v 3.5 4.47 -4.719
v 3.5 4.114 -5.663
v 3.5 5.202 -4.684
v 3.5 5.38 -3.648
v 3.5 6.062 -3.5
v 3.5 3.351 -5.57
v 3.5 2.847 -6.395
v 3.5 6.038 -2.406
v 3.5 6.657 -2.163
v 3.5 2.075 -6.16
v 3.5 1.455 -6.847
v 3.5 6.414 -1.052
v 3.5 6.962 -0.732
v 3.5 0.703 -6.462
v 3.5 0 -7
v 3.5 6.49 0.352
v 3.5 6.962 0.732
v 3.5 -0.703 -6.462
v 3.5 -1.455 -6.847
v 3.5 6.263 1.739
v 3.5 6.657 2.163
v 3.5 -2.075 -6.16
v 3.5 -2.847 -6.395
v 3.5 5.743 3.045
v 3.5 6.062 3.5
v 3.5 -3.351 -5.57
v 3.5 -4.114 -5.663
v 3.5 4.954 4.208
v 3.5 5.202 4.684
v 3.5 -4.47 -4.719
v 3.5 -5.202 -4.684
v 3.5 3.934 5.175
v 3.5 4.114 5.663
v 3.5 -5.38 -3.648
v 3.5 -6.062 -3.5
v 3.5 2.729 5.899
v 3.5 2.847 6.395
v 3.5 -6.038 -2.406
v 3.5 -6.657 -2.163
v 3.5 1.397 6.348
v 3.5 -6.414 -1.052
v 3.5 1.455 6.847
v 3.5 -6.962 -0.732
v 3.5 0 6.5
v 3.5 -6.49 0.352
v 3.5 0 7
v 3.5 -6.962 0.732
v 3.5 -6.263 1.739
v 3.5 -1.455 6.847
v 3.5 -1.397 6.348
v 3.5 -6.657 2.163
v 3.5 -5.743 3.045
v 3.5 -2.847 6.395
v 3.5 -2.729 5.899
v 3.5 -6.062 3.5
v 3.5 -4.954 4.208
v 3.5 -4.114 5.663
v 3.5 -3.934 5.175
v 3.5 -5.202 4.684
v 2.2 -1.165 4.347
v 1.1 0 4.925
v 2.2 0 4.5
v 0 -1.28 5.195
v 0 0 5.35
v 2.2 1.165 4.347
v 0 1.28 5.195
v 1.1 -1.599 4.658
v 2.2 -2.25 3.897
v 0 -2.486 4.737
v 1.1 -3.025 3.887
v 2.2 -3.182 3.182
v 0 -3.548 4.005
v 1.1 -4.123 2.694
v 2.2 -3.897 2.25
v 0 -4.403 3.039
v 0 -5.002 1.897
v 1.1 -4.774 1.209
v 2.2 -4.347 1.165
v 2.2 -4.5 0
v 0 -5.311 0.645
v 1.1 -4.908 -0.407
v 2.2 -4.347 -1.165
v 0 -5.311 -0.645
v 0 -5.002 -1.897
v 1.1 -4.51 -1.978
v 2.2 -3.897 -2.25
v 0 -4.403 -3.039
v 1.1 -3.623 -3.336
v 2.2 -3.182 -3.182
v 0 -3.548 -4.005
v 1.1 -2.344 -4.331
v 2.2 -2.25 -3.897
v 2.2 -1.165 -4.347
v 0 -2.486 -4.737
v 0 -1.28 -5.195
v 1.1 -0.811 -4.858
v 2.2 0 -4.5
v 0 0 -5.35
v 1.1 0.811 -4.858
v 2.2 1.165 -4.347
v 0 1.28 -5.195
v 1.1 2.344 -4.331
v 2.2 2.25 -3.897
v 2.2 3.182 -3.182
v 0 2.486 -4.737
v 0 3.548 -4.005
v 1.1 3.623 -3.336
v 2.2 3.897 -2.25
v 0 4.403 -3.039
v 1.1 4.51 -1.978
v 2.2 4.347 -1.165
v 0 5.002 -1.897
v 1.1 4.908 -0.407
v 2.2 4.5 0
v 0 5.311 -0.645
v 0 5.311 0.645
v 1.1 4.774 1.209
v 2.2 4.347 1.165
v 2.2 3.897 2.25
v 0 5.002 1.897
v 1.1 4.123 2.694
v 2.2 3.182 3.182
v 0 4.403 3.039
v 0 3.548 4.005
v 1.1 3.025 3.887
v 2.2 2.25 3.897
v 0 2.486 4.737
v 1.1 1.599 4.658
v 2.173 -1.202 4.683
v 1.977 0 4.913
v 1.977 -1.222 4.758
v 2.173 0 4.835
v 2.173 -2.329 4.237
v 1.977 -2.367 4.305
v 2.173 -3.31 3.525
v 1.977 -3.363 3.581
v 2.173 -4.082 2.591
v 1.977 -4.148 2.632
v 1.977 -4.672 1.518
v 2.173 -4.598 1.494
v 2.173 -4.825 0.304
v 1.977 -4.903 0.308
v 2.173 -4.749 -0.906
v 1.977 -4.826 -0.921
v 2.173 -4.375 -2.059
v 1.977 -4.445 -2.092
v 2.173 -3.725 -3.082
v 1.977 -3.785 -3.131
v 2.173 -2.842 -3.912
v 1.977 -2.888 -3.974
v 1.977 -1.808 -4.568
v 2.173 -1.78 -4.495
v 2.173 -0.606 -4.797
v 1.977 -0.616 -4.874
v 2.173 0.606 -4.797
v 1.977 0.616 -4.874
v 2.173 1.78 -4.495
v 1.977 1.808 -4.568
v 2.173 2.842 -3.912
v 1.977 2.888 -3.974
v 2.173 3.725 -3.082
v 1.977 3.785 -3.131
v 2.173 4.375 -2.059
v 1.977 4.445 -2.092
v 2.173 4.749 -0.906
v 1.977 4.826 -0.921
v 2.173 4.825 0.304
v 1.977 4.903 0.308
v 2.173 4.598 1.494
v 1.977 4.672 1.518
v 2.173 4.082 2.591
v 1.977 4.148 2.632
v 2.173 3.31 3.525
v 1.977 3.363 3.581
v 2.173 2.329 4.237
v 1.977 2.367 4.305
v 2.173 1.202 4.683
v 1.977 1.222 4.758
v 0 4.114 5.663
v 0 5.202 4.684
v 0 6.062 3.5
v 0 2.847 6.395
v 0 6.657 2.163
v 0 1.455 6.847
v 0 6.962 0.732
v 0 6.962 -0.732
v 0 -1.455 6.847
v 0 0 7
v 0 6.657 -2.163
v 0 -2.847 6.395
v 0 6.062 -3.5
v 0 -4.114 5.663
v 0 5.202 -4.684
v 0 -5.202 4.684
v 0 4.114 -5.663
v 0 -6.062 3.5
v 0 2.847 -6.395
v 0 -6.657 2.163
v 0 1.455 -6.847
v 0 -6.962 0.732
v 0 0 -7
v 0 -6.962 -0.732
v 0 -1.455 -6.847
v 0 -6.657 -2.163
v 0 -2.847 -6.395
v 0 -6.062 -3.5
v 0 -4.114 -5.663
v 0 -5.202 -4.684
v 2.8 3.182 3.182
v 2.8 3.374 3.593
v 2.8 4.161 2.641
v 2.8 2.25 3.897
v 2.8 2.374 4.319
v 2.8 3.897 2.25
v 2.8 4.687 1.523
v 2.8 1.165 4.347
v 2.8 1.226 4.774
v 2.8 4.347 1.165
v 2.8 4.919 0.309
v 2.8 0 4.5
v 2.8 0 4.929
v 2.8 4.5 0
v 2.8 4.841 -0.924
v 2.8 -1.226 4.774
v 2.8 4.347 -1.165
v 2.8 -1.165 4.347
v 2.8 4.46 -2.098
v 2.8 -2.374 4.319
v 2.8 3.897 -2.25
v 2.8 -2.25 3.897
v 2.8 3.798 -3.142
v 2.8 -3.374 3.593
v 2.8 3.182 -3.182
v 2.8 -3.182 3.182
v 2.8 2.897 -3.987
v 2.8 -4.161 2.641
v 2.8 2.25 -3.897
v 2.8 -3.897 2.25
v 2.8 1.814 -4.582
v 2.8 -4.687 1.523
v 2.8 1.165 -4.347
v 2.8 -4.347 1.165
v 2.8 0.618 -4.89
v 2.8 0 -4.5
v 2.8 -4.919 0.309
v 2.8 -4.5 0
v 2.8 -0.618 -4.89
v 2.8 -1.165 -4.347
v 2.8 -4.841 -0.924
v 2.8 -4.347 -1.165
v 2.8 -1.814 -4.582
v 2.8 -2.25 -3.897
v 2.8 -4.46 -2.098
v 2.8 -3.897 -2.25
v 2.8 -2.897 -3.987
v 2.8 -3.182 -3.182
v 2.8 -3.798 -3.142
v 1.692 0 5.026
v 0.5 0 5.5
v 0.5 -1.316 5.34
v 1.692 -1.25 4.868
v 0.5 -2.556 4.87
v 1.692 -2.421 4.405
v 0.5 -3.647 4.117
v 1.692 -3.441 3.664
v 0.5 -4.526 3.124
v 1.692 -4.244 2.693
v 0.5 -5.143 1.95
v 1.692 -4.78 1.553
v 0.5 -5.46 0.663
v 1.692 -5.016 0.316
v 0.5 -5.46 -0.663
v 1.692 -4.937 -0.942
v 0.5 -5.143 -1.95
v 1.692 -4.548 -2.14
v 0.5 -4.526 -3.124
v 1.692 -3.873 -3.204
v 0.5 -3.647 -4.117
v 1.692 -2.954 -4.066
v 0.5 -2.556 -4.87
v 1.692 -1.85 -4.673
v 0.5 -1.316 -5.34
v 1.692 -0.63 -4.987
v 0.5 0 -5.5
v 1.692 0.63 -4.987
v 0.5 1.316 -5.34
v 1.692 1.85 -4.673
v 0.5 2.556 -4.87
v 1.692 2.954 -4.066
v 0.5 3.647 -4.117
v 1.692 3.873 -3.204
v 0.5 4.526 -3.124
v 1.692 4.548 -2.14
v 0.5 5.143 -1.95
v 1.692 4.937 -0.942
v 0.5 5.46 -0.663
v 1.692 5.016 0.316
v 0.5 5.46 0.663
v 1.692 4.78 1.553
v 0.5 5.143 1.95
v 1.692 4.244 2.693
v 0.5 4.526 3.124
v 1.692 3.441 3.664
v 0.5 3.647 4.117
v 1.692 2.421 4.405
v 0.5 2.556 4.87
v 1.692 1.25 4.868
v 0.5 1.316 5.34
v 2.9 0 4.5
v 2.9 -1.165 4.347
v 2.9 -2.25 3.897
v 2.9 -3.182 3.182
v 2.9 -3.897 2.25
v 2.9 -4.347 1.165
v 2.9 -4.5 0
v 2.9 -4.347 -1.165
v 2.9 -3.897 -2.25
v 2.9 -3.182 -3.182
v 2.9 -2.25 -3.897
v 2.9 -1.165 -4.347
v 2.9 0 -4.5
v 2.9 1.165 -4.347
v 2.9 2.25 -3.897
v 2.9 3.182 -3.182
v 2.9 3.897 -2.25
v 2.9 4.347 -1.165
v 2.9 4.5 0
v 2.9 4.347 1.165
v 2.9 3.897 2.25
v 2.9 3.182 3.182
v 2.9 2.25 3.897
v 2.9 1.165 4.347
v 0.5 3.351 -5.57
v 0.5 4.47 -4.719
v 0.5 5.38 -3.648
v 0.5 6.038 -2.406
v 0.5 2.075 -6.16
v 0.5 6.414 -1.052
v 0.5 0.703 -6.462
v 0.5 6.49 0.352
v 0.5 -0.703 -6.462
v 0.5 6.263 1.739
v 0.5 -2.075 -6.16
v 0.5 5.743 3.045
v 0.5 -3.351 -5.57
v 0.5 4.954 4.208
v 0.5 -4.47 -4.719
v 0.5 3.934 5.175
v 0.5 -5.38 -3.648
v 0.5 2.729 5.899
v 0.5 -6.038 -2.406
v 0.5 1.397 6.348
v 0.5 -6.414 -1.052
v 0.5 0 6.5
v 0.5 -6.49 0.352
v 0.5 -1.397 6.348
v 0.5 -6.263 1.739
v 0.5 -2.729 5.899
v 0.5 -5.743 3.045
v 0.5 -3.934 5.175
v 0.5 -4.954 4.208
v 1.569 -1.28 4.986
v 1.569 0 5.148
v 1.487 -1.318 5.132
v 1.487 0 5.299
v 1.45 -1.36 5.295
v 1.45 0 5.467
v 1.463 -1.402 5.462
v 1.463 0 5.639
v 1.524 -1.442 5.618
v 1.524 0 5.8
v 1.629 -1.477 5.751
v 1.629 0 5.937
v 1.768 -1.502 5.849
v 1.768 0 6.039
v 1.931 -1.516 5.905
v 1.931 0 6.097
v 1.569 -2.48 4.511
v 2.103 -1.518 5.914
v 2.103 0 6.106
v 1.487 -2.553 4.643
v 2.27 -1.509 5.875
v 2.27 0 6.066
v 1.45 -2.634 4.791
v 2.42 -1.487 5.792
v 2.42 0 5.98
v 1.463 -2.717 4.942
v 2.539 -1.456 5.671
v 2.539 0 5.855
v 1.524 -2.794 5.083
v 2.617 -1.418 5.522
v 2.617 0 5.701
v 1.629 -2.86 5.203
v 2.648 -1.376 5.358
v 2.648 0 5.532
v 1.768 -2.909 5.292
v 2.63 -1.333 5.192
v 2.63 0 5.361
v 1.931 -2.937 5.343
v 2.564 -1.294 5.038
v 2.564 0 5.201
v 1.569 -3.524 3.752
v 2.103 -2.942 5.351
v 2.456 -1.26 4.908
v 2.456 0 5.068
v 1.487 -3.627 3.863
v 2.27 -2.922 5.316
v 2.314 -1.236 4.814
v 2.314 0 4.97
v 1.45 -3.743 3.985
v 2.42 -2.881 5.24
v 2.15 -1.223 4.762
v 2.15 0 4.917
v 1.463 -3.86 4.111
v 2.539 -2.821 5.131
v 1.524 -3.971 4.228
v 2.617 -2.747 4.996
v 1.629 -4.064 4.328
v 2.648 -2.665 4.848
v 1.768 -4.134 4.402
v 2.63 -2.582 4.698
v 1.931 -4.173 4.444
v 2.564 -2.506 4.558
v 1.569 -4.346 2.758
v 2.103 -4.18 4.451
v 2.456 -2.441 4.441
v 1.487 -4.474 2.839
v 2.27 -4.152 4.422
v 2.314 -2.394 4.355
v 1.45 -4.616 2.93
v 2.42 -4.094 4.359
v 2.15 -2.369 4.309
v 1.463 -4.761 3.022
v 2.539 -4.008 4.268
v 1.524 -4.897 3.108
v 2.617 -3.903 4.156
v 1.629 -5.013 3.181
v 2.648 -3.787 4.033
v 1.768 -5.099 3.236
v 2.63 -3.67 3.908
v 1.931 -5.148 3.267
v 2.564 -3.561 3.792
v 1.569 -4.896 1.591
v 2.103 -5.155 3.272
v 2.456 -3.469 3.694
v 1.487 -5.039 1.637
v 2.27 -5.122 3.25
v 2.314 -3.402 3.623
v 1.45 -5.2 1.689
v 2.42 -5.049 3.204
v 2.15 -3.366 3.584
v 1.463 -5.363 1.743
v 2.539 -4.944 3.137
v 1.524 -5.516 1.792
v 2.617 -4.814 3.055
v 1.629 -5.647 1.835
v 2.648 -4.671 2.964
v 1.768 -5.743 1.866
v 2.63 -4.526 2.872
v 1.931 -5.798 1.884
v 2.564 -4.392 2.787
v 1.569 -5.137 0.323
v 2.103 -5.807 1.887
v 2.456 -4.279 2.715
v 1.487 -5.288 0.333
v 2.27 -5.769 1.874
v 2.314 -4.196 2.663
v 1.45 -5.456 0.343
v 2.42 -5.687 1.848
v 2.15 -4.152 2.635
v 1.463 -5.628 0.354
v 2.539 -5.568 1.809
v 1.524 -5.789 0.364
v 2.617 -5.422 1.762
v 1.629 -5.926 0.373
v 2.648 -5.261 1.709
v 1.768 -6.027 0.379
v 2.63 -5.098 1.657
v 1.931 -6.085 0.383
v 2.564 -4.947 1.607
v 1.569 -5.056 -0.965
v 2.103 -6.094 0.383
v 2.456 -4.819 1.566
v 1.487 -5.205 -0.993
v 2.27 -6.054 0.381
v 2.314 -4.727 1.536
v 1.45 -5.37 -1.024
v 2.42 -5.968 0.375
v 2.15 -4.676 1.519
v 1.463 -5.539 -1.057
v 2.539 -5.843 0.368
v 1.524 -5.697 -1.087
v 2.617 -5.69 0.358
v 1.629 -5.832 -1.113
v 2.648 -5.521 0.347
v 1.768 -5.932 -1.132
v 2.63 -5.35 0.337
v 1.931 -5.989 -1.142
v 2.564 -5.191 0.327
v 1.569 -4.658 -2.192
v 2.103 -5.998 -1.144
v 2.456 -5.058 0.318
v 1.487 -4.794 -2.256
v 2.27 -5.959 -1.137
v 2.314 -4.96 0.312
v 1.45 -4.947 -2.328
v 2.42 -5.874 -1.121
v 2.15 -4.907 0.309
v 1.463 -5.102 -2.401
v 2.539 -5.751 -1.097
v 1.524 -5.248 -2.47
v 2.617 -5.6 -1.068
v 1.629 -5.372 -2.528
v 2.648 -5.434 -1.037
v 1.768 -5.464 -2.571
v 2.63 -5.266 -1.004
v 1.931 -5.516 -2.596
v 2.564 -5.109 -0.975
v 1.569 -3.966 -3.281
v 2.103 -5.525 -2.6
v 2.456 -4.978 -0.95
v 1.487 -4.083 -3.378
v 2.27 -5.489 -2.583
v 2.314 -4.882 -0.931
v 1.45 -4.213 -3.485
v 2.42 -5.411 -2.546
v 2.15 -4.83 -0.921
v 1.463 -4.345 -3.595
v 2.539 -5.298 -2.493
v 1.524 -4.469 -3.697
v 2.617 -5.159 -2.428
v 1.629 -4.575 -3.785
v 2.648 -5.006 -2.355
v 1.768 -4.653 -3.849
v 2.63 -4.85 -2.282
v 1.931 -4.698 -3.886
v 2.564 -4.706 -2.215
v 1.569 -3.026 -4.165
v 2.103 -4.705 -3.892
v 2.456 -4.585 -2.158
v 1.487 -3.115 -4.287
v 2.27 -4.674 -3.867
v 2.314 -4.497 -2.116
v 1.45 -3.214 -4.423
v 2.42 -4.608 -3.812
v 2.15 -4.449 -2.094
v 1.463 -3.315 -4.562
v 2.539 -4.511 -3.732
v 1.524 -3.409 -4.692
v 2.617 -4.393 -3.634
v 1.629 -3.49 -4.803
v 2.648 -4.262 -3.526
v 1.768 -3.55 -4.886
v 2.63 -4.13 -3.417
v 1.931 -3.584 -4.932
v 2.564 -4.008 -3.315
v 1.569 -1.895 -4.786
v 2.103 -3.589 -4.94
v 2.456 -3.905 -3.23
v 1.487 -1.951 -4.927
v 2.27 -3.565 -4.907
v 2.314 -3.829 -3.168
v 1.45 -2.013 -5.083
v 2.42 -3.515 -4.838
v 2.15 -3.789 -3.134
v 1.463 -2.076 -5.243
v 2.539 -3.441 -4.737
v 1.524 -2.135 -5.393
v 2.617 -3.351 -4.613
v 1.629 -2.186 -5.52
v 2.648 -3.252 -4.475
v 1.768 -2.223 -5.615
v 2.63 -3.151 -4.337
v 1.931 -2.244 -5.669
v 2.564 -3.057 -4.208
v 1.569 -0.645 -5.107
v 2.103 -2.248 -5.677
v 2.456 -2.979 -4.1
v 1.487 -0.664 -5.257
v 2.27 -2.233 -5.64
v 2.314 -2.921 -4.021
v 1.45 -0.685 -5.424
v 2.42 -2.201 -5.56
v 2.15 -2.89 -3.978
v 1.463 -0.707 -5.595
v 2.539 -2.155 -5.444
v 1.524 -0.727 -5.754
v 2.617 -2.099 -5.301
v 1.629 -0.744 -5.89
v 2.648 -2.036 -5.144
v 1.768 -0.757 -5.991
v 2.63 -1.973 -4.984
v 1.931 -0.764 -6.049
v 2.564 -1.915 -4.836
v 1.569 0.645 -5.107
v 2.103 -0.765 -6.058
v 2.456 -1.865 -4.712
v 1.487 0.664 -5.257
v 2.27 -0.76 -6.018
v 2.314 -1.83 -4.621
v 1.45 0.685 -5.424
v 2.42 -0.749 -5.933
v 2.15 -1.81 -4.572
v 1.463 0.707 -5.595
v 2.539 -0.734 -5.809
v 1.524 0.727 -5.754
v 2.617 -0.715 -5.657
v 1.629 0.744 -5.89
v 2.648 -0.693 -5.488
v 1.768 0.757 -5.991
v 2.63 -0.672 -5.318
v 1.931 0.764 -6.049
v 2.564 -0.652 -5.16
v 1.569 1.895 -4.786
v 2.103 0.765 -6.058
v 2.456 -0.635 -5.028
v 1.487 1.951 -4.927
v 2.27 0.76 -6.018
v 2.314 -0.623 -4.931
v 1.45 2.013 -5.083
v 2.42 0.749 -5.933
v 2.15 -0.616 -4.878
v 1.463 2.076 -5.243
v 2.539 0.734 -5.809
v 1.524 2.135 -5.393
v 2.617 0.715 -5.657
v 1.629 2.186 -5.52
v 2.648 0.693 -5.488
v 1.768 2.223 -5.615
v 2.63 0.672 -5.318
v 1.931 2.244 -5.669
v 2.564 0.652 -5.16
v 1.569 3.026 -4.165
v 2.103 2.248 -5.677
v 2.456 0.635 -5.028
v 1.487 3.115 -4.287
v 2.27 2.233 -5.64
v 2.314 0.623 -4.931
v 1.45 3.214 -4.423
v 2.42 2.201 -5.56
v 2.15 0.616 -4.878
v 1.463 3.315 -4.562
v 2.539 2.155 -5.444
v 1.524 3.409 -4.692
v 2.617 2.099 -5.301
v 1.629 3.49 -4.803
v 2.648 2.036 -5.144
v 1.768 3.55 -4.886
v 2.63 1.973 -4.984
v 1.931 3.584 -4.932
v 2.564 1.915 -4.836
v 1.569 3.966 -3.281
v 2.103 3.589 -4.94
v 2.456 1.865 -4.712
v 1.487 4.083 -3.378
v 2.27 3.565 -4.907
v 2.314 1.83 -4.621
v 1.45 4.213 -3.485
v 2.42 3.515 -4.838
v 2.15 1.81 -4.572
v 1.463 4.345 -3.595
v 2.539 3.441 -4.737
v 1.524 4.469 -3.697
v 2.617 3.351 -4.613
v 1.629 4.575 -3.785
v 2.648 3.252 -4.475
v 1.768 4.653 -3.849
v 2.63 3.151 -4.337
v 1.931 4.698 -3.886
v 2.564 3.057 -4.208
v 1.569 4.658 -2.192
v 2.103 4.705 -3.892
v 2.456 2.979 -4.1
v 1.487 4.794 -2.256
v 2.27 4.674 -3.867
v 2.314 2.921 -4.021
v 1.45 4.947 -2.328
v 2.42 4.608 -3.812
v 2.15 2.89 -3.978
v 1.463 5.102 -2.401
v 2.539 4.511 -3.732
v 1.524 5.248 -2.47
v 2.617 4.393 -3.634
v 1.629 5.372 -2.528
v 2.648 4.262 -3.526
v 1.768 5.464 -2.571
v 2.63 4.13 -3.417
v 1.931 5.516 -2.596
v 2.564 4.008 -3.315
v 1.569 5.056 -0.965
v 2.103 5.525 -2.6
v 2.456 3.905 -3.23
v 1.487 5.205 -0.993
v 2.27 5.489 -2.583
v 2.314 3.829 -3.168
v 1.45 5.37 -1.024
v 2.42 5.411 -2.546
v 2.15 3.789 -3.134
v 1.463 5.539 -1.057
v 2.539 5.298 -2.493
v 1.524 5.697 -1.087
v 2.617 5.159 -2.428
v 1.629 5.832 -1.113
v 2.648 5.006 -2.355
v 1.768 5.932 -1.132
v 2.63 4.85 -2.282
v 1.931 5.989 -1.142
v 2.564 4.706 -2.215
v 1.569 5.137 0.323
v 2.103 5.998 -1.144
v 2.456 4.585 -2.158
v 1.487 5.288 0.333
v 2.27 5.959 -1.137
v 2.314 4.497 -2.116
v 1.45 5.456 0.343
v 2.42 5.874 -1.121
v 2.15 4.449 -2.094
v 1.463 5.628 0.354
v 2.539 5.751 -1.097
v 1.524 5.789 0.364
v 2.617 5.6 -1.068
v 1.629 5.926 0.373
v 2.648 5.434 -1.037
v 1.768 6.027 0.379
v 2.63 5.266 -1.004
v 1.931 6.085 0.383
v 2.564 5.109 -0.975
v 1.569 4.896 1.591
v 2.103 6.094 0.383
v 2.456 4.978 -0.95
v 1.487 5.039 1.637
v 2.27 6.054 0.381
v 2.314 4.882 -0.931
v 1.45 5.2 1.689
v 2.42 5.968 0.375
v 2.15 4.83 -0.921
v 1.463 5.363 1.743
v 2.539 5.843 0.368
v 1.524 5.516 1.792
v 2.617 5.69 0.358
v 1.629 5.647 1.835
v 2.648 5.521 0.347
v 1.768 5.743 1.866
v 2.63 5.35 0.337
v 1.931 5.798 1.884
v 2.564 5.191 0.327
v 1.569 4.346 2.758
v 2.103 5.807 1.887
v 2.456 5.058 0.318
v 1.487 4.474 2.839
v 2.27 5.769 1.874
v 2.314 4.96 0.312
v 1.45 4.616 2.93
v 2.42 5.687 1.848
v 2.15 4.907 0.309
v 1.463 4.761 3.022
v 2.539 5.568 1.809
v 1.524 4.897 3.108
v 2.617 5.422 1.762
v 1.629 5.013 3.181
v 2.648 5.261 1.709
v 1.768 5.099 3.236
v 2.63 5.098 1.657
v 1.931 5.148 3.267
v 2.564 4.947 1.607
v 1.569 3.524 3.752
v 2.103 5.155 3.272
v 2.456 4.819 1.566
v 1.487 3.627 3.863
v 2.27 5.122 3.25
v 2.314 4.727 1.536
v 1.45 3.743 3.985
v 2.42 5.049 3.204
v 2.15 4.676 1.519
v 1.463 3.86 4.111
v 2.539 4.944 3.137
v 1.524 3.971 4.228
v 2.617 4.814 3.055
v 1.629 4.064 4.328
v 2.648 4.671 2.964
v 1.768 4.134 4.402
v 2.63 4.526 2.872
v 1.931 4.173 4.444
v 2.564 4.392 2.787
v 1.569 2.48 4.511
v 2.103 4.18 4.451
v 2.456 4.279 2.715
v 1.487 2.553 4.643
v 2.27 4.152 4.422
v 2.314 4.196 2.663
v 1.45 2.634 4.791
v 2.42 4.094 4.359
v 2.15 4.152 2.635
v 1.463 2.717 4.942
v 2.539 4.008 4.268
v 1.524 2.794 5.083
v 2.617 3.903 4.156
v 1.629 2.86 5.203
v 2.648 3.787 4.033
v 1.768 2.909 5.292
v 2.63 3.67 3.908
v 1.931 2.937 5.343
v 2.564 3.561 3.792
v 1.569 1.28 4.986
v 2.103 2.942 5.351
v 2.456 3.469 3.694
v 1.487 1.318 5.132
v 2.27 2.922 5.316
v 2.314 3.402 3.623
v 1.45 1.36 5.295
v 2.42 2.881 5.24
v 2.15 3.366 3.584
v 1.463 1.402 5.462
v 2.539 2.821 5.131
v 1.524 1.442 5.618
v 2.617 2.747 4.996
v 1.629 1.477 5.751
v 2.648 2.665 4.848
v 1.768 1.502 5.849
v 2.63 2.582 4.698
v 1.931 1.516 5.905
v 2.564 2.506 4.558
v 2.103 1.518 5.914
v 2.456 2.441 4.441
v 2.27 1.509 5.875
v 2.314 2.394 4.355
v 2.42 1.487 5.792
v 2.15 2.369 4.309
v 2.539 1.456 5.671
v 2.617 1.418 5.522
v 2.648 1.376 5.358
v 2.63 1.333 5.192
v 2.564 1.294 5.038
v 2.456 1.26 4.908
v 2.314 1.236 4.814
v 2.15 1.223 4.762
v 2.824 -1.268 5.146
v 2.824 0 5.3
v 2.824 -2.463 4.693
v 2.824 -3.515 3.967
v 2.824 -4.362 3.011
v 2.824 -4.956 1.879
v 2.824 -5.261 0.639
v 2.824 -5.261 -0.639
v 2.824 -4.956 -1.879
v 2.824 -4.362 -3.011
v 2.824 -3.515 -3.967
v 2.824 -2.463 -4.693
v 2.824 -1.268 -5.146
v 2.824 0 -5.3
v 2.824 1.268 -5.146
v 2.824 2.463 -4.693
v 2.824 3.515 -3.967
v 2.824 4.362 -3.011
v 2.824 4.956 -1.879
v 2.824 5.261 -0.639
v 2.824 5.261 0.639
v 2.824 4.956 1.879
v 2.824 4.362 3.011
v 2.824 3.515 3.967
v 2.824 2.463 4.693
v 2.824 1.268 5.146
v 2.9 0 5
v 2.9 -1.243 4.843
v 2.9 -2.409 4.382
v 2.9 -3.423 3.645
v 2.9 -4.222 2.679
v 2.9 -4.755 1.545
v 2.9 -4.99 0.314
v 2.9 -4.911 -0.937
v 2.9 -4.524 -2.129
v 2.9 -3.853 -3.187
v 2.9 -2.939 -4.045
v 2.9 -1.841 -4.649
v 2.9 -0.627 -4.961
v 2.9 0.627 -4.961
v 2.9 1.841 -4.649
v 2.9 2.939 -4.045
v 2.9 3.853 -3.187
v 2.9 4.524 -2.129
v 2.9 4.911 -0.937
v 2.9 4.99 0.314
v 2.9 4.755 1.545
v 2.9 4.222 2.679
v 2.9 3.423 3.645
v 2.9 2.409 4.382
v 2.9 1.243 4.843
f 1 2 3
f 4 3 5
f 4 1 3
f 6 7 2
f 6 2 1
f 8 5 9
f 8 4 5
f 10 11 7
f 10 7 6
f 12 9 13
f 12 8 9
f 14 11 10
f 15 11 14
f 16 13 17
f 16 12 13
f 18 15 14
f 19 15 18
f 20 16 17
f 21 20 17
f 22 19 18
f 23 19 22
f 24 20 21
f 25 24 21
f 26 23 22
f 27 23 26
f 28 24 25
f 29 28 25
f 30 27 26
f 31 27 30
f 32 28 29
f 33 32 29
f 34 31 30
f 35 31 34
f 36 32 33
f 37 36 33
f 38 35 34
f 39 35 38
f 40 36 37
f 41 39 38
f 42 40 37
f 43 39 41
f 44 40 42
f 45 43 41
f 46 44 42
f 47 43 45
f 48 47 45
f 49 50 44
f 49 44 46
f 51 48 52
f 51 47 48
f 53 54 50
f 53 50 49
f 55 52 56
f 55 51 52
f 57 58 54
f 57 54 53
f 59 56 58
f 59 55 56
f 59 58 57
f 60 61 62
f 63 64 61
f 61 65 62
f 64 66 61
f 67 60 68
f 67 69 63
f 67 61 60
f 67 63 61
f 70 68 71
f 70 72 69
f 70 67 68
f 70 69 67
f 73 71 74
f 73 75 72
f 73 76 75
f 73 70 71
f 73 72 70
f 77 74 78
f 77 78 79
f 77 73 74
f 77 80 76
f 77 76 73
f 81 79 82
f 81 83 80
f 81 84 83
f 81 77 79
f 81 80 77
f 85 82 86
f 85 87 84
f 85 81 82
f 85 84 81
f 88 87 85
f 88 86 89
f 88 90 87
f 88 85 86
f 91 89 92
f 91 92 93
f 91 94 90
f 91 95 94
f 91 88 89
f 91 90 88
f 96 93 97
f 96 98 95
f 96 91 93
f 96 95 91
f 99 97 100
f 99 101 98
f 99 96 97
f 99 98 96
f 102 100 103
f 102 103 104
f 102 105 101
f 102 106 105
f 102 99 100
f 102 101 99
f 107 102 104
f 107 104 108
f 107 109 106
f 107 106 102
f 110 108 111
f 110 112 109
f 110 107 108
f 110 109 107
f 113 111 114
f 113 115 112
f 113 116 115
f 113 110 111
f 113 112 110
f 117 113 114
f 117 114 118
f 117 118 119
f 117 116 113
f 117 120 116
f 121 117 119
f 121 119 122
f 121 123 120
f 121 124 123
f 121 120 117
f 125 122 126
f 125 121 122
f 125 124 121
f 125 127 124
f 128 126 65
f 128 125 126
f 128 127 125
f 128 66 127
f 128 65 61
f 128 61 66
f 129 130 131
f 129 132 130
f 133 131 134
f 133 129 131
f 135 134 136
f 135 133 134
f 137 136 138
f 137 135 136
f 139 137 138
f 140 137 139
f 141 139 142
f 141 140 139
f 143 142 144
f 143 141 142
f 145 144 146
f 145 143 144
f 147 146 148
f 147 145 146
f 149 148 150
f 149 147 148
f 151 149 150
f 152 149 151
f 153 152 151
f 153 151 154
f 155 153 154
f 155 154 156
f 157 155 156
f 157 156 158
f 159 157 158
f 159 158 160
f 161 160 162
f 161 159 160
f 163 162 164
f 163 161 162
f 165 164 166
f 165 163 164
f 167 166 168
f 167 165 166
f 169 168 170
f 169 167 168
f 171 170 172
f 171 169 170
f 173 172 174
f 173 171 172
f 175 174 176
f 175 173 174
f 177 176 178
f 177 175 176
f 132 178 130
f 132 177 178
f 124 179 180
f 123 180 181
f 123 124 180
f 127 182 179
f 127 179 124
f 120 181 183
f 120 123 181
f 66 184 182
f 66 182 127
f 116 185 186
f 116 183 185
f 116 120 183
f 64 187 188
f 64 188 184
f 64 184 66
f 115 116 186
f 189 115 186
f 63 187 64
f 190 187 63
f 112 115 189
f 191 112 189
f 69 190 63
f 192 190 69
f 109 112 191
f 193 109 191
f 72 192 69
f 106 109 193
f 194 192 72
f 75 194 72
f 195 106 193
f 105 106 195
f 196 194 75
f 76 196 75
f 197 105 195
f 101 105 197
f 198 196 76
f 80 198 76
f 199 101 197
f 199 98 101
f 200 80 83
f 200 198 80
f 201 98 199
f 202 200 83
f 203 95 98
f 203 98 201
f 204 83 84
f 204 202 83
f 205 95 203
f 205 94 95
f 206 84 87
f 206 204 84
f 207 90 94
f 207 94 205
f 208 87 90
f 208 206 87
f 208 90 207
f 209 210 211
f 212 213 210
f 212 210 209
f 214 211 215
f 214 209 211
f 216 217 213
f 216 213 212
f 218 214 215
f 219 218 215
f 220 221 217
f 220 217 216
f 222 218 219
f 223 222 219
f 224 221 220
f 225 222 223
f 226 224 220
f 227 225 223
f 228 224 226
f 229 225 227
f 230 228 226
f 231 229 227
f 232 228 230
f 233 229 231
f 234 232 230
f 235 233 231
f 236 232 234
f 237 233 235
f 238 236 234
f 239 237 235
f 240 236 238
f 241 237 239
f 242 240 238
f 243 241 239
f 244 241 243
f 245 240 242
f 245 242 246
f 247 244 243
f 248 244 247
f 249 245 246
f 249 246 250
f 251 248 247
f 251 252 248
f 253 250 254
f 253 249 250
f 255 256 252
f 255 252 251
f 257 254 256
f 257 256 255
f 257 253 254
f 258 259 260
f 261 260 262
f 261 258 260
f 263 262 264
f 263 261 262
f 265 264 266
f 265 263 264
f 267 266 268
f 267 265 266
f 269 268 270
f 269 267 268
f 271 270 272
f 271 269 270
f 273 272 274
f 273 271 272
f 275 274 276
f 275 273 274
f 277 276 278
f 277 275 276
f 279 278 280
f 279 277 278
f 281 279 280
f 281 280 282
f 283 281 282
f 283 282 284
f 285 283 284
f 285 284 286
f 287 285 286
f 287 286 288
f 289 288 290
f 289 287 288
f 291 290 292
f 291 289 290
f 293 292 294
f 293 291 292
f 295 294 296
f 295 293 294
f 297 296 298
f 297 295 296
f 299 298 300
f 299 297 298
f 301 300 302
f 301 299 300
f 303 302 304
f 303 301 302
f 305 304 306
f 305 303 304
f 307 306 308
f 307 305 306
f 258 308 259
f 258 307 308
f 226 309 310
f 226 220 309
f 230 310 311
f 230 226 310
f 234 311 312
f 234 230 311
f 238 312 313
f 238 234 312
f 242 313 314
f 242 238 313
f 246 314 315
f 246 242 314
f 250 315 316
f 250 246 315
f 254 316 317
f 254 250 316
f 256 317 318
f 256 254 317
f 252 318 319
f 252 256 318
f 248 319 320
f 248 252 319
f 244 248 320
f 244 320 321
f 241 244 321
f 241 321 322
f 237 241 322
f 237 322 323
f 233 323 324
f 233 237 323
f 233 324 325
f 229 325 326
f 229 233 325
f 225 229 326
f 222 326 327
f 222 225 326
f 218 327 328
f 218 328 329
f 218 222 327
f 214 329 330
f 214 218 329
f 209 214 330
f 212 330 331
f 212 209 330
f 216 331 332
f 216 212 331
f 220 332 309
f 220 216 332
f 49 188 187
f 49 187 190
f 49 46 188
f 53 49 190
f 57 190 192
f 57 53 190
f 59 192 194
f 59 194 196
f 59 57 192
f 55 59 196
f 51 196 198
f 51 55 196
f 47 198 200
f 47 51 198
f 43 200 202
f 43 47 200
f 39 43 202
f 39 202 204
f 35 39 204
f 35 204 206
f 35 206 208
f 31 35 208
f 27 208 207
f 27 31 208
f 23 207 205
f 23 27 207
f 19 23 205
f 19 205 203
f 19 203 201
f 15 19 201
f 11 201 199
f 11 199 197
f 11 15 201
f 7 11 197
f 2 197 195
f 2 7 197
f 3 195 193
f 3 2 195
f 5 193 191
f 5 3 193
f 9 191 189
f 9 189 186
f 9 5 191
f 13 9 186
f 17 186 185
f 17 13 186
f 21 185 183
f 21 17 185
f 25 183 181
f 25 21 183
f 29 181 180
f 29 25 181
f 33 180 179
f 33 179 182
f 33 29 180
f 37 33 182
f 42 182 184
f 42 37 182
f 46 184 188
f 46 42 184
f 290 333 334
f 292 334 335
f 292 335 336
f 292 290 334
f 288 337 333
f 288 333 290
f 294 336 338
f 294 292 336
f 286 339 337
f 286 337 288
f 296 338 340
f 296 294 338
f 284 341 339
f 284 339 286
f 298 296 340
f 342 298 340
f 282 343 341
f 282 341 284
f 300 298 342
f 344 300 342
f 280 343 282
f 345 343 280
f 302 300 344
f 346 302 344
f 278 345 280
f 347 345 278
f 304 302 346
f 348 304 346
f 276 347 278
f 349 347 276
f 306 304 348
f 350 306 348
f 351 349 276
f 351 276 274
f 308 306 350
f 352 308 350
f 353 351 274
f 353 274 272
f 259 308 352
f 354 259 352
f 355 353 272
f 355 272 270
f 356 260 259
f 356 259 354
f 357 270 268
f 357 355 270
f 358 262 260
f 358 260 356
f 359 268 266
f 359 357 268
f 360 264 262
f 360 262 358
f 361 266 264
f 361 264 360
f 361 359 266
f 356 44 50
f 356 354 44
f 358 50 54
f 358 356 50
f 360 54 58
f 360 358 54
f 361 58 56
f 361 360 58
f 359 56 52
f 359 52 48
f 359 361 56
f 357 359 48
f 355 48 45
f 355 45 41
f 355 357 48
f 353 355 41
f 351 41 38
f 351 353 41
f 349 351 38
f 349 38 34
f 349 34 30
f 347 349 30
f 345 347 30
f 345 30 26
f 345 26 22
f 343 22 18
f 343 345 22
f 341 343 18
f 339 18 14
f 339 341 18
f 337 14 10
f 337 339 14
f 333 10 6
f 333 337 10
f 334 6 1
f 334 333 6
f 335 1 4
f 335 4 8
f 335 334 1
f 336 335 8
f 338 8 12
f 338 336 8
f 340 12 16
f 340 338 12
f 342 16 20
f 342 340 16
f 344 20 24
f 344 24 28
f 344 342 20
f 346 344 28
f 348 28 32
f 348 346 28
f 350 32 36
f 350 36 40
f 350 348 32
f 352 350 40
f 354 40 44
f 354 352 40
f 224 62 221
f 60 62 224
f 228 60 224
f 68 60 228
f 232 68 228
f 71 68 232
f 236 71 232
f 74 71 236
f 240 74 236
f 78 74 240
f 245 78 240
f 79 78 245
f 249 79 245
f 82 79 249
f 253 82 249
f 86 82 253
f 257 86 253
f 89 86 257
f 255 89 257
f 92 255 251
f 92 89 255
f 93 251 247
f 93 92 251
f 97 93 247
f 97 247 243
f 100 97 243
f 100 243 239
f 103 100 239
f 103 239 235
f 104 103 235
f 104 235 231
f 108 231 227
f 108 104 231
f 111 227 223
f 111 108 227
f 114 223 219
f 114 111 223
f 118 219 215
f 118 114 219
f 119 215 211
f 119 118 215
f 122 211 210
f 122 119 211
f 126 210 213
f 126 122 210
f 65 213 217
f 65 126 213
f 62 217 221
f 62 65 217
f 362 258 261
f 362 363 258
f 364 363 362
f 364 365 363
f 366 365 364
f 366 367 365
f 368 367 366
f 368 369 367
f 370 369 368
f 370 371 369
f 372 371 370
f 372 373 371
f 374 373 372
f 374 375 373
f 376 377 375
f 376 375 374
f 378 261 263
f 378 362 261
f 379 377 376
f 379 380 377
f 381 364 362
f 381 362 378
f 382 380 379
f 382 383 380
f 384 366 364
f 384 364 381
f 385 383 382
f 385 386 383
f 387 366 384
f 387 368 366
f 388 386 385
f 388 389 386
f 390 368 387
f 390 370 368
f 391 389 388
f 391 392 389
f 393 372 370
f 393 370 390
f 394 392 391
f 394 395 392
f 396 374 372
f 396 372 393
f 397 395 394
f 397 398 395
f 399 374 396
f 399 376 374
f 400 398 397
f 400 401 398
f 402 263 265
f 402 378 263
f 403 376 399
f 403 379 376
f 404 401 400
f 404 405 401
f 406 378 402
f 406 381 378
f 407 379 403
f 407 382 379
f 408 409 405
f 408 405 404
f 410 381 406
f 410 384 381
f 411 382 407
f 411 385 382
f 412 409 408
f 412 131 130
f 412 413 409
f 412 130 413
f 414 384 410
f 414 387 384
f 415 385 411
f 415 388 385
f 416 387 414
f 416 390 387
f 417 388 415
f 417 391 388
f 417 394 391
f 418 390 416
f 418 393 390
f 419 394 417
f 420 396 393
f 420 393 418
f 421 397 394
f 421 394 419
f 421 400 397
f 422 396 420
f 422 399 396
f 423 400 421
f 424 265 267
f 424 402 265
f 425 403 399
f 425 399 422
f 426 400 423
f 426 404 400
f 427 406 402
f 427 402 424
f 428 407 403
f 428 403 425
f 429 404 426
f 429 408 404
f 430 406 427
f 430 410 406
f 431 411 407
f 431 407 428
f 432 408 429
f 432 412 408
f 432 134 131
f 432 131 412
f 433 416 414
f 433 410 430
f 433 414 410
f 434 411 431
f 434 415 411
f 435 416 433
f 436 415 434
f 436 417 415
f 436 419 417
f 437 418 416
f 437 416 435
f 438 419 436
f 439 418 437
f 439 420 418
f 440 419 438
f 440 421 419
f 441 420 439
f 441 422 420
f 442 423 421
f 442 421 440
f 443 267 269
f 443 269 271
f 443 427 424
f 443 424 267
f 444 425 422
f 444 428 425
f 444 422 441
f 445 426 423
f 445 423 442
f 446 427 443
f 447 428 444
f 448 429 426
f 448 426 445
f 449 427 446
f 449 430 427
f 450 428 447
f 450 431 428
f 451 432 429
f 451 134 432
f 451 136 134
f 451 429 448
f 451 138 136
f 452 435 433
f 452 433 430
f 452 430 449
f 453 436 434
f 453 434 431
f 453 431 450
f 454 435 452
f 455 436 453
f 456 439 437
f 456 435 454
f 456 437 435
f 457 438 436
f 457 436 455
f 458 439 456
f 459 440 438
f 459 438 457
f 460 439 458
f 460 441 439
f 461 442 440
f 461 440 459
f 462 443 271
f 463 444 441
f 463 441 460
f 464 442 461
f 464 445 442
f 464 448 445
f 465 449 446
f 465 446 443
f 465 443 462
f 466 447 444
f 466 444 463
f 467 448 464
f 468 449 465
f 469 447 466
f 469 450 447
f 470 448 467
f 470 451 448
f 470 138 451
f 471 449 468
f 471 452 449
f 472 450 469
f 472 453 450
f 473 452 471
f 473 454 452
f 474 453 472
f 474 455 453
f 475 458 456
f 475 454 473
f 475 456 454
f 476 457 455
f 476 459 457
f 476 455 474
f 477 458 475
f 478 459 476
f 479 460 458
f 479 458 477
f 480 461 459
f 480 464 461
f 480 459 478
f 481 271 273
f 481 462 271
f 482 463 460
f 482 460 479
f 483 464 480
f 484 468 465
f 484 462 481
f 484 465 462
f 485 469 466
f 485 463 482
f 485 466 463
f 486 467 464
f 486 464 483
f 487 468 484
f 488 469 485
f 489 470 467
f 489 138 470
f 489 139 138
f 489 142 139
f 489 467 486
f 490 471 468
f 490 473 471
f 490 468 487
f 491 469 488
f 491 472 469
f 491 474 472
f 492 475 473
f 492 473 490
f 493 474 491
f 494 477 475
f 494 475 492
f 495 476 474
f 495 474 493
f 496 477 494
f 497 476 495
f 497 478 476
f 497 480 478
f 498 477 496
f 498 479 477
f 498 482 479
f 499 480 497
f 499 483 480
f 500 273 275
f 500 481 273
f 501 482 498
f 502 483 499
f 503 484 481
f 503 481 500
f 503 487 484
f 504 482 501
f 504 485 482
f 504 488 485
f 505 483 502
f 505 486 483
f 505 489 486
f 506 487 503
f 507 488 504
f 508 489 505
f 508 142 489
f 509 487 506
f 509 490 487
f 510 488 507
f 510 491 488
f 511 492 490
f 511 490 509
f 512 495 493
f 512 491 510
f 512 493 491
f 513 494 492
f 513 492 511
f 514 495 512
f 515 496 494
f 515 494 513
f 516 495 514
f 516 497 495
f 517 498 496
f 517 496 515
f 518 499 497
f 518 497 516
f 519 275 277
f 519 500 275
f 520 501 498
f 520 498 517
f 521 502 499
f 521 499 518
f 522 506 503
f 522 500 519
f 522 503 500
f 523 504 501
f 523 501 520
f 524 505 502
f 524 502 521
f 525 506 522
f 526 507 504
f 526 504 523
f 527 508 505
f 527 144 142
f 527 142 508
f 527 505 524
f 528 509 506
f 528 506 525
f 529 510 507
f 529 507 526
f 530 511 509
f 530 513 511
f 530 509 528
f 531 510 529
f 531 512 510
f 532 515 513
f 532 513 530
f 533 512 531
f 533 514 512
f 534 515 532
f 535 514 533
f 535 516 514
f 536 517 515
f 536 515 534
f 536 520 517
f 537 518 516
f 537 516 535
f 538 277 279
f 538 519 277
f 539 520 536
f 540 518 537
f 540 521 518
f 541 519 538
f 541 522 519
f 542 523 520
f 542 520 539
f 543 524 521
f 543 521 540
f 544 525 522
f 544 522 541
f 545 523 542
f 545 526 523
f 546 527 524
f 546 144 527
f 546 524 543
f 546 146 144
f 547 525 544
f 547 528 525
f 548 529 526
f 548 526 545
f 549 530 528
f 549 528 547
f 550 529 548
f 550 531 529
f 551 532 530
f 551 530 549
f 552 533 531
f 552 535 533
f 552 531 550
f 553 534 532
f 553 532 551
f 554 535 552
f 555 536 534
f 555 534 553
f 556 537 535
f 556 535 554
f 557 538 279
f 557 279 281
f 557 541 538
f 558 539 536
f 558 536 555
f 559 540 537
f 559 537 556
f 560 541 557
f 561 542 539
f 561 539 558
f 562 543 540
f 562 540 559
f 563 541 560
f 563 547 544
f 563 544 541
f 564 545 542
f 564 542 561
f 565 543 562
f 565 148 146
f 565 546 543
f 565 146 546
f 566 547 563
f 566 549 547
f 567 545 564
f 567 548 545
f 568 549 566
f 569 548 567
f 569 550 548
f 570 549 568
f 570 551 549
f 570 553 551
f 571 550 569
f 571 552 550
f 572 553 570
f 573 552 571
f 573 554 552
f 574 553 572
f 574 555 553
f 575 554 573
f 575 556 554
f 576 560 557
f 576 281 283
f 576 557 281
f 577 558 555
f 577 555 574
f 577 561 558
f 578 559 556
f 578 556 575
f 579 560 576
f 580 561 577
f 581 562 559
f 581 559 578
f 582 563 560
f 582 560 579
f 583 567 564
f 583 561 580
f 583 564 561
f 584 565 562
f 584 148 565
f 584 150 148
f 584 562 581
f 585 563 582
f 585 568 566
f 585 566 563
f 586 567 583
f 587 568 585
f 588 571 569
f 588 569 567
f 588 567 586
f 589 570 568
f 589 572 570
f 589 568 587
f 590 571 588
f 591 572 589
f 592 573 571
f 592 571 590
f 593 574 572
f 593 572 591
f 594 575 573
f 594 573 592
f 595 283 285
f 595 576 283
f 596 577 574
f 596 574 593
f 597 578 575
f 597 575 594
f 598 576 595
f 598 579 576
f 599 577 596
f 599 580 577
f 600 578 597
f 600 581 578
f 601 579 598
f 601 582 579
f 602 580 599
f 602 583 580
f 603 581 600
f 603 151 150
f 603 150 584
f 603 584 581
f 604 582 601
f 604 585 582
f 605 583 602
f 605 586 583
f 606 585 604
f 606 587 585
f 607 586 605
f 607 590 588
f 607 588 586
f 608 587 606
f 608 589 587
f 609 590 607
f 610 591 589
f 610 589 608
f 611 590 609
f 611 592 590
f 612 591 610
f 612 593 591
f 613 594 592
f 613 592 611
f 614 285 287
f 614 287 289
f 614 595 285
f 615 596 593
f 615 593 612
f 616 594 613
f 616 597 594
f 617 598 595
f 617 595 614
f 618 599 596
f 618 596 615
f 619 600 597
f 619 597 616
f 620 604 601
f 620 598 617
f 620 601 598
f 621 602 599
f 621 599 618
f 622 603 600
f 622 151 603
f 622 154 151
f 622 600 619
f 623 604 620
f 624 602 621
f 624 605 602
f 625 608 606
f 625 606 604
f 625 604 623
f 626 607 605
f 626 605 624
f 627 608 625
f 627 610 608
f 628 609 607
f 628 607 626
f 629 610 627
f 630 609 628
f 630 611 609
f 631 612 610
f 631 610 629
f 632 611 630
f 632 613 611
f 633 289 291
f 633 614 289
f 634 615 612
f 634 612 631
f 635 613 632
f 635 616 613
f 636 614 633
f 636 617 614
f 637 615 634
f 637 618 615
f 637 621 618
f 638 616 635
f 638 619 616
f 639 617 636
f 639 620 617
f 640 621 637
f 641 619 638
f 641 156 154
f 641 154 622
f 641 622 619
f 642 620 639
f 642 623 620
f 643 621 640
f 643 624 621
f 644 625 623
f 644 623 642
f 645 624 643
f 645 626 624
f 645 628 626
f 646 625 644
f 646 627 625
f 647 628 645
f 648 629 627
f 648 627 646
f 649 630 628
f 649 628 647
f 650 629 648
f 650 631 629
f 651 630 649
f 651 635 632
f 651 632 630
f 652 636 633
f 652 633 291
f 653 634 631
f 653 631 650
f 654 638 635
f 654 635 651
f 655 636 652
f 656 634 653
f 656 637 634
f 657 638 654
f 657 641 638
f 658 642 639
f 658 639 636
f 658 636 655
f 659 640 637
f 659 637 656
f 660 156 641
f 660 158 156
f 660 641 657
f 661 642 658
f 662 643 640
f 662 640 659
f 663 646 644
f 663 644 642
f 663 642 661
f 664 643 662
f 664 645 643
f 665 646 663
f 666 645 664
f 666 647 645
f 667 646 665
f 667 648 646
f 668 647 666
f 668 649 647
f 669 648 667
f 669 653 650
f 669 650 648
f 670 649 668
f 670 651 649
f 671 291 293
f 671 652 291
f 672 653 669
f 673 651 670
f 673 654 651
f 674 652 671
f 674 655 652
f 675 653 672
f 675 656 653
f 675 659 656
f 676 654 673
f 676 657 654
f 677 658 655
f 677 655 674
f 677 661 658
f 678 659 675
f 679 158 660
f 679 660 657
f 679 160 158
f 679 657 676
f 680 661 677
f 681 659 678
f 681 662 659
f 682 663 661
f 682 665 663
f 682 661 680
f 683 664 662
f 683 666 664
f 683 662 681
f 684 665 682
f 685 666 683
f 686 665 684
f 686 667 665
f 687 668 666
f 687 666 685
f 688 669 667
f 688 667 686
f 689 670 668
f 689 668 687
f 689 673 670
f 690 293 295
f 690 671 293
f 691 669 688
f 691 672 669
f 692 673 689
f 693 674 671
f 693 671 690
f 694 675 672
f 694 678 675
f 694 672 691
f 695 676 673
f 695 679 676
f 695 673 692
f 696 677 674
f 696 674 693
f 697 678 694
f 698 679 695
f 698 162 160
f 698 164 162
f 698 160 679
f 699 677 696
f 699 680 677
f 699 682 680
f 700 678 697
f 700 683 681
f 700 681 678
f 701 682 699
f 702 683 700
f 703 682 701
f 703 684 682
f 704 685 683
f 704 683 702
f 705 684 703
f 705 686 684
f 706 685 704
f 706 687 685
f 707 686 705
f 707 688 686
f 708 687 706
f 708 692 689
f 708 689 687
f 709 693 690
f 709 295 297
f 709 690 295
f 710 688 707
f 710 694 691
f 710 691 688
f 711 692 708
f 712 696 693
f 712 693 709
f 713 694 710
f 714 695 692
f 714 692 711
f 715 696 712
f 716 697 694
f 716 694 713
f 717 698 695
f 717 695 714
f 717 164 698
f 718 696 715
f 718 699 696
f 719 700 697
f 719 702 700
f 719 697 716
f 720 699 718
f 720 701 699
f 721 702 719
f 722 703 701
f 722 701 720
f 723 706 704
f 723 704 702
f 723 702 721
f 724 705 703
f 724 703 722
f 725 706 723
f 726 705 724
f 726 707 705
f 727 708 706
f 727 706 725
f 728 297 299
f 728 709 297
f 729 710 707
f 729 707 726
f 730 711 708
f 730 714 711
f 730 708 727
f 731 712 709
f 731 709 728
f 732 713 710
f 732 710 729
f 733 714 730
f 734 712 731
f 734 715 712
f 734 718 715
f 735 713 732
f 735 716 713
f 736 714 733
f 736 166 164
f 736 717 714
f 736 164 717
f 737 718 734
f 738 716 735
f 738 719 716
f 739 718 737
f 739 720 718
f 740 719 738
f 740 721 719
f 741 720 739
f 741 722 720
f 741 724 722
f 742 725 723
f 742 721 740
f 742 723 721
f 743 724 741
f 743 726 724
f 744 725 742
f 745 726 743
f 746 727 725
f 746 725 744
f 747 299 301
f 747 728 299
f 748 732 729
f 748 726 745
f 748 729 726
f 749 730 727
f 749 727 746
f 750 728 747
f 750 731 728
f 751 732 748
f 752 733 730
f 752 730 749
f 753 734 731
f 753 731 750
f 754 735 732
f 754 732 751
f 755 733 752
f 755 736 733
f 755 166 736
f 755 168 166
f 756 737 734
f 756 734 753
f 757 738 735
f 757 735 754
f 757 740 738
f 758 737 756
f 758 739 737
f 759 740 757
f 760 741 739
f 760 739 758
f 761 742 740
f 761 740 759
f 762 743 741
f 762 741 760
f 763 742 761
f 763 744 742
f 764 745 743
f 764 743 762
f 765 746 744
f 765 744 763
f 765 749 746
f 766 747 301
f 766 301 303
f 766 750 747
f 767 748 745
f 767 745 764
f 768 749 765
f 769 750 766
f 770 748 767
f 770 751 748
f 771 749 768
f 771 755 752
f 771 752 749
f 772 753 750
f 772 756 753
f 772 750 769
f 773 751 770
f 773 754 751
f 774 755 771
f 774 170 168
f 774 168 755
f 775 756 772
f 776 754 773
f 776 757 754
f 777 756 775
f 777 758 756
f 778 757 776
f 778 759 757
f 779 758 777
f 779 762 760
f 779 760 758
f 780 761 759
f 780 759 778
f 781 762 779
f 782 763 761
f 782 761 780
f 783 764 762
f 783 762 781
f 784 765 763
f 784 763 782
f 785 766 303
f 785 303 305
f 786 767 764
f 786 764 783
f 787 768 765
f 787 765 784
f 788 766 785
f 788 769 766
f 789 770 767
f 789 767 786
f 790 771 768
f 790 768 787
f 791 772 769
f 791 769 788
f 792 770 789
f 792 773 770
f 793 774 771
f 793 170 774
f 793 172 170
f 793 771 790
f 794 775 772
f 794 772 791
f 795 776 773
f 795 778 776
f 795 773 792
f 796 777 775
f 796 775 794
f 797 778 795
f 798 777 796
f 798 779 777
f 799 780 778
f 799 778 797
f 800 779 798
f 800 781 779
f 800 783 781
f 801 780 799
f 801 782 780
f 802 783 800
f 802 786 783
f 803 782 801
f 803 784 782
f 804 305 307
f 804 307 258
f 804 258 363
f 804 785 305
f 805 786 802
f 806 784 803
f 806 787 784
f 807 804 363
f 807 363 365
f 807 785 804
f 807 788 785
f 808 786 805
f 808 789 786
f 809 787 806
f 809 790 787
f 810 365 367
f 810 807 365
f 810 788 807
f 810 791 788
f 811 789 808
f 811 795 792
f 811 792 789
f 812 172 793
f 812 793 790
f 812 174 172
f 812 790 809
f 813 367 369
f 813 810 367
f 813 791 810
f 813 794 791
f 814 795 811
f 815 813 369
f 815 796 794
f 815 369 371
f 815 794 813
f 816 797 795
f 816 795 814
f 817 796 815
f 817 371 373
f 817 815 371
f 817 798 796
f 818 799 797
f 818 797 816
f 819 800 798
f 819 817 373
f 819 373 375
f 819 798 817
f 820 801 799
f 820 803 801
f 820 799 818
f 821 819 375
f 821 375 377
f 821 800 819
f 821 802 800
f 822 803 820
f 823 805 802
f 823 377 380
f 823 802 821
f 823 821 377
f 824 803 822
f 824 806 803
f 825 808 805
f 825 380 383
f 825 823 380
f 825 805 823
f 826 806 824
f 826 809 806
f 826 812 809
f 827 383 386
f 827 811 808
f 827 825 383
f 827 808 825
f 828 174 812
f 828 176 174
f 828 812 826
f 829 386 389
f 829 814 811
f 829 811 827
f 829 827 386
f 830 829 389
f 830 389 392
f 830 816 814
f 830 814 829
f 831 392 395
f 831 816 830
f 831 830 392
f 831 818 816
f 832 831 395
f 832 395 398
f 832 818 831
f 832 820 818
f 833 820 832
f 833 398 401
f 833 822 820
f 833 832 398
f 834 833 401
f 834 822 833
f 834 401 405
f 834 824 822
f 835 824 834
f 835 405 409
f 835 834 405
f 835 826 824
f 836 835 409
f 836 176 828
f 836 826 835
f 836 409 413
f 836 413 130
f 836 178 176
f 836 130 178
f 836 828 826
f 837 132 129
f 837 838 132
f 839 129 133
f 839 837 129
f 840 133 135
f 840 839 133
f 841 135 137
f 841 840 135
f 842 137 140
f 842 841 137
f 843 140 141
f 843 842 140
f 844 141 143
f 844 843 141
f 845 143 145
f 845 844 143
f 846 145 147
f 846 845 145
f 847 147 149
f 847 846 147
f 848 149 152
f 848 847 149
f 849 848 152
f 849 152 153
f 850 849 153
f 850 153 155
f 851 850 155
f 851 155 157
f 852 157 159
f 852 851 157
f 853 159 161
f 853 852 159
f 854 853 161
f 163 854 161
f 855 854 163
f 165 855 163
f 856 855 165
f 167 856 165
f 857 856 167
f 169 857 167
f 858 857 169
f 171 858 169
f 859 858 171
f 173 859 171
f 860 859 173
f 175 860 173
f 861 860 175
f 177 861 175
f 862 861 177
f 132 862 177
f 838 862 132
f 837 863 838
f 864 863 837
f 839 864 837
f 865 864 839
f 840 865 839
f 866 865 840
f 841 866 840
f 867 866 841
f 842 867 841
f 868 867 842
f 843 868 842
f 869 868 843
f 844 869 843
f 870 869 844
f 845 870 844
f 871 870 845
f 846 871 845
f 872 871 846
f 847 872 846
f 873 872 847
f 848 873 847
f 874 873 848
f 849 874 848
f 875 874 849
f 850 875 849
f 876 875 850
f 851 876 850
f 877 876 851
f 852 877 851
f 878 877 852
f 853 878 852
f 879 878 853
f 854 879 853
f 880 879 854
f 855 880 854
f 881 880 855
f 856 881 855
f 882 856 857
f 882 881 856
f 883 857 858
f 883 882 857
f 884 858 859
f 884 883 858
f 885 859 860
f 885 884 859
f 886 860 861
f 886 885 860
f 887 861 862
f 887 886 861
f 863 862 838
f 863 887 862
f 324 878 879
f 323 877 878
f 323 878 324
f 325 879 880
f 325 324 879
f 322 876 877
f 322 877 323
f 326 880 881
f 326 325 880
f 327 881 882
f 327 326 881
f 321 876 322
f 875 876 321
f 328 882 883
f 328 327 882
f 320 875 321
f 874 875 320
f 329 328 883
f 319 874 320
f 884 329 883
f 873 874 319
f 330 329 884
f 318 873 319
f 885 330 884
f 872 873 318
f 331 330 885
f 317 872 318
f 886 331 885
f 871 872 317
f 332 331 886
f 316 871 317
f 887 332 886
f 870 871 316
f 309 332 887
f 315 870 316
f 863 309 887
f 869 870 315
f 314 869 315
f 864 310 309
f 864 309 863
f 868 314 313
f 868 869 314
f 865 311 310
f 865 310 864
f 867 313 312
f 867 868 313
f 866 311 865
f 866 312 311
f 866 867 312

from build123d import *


with BuildPart() as part:
    # Sketch1 → Revolve5 (revolve)
    with BuildSketch(Plane.XY, mode=Mode.PRIVATE) as revolve5_sk:
        with BuildLine():
            Line((0, 7), (3.5, 7))
            Line((3.5, 7), (3.5, 6.5))
            Line((3.5, 6.5), (0.5, 6.5))
            Line((0.5, 6.5), (0.5, 5.5))
            Line((0.5, 5.5), (1.691723883, 5.026212332))
            ThreePointArc((1.691723883, 5.026212332), (2.270416983, 6.065978794), (1.977233578, 4.912703679))
            Line((1.977233578, 4.912703679), (2.17265883, 4.835009445))
            Line((2.17265883, 4.835009445), (2.823645607, 5.3))
            Line((2.823645607, 5.3), (2.9, 5))
            Line((2.9, 5), (2.9, 4.5))
            Line((2.9, 4.5), (2.8, 4.5))
            Line((2.8, 4.5), (2.8, 4.928571429))
            Line((2.8, 4.928571429), (2.2, 4.5))
            Line((2.2, 4.5), (0, 5.35))
            Line((0, 5.35), (0, 7))
        make_face()
    revolve(revolve5_sk.sketch.rotate(Axis((0, 0, 0), (1, 0, 0)), 90), axis=Axis((0, 0, 0), (1, 0, 0)))


solid = part.part
